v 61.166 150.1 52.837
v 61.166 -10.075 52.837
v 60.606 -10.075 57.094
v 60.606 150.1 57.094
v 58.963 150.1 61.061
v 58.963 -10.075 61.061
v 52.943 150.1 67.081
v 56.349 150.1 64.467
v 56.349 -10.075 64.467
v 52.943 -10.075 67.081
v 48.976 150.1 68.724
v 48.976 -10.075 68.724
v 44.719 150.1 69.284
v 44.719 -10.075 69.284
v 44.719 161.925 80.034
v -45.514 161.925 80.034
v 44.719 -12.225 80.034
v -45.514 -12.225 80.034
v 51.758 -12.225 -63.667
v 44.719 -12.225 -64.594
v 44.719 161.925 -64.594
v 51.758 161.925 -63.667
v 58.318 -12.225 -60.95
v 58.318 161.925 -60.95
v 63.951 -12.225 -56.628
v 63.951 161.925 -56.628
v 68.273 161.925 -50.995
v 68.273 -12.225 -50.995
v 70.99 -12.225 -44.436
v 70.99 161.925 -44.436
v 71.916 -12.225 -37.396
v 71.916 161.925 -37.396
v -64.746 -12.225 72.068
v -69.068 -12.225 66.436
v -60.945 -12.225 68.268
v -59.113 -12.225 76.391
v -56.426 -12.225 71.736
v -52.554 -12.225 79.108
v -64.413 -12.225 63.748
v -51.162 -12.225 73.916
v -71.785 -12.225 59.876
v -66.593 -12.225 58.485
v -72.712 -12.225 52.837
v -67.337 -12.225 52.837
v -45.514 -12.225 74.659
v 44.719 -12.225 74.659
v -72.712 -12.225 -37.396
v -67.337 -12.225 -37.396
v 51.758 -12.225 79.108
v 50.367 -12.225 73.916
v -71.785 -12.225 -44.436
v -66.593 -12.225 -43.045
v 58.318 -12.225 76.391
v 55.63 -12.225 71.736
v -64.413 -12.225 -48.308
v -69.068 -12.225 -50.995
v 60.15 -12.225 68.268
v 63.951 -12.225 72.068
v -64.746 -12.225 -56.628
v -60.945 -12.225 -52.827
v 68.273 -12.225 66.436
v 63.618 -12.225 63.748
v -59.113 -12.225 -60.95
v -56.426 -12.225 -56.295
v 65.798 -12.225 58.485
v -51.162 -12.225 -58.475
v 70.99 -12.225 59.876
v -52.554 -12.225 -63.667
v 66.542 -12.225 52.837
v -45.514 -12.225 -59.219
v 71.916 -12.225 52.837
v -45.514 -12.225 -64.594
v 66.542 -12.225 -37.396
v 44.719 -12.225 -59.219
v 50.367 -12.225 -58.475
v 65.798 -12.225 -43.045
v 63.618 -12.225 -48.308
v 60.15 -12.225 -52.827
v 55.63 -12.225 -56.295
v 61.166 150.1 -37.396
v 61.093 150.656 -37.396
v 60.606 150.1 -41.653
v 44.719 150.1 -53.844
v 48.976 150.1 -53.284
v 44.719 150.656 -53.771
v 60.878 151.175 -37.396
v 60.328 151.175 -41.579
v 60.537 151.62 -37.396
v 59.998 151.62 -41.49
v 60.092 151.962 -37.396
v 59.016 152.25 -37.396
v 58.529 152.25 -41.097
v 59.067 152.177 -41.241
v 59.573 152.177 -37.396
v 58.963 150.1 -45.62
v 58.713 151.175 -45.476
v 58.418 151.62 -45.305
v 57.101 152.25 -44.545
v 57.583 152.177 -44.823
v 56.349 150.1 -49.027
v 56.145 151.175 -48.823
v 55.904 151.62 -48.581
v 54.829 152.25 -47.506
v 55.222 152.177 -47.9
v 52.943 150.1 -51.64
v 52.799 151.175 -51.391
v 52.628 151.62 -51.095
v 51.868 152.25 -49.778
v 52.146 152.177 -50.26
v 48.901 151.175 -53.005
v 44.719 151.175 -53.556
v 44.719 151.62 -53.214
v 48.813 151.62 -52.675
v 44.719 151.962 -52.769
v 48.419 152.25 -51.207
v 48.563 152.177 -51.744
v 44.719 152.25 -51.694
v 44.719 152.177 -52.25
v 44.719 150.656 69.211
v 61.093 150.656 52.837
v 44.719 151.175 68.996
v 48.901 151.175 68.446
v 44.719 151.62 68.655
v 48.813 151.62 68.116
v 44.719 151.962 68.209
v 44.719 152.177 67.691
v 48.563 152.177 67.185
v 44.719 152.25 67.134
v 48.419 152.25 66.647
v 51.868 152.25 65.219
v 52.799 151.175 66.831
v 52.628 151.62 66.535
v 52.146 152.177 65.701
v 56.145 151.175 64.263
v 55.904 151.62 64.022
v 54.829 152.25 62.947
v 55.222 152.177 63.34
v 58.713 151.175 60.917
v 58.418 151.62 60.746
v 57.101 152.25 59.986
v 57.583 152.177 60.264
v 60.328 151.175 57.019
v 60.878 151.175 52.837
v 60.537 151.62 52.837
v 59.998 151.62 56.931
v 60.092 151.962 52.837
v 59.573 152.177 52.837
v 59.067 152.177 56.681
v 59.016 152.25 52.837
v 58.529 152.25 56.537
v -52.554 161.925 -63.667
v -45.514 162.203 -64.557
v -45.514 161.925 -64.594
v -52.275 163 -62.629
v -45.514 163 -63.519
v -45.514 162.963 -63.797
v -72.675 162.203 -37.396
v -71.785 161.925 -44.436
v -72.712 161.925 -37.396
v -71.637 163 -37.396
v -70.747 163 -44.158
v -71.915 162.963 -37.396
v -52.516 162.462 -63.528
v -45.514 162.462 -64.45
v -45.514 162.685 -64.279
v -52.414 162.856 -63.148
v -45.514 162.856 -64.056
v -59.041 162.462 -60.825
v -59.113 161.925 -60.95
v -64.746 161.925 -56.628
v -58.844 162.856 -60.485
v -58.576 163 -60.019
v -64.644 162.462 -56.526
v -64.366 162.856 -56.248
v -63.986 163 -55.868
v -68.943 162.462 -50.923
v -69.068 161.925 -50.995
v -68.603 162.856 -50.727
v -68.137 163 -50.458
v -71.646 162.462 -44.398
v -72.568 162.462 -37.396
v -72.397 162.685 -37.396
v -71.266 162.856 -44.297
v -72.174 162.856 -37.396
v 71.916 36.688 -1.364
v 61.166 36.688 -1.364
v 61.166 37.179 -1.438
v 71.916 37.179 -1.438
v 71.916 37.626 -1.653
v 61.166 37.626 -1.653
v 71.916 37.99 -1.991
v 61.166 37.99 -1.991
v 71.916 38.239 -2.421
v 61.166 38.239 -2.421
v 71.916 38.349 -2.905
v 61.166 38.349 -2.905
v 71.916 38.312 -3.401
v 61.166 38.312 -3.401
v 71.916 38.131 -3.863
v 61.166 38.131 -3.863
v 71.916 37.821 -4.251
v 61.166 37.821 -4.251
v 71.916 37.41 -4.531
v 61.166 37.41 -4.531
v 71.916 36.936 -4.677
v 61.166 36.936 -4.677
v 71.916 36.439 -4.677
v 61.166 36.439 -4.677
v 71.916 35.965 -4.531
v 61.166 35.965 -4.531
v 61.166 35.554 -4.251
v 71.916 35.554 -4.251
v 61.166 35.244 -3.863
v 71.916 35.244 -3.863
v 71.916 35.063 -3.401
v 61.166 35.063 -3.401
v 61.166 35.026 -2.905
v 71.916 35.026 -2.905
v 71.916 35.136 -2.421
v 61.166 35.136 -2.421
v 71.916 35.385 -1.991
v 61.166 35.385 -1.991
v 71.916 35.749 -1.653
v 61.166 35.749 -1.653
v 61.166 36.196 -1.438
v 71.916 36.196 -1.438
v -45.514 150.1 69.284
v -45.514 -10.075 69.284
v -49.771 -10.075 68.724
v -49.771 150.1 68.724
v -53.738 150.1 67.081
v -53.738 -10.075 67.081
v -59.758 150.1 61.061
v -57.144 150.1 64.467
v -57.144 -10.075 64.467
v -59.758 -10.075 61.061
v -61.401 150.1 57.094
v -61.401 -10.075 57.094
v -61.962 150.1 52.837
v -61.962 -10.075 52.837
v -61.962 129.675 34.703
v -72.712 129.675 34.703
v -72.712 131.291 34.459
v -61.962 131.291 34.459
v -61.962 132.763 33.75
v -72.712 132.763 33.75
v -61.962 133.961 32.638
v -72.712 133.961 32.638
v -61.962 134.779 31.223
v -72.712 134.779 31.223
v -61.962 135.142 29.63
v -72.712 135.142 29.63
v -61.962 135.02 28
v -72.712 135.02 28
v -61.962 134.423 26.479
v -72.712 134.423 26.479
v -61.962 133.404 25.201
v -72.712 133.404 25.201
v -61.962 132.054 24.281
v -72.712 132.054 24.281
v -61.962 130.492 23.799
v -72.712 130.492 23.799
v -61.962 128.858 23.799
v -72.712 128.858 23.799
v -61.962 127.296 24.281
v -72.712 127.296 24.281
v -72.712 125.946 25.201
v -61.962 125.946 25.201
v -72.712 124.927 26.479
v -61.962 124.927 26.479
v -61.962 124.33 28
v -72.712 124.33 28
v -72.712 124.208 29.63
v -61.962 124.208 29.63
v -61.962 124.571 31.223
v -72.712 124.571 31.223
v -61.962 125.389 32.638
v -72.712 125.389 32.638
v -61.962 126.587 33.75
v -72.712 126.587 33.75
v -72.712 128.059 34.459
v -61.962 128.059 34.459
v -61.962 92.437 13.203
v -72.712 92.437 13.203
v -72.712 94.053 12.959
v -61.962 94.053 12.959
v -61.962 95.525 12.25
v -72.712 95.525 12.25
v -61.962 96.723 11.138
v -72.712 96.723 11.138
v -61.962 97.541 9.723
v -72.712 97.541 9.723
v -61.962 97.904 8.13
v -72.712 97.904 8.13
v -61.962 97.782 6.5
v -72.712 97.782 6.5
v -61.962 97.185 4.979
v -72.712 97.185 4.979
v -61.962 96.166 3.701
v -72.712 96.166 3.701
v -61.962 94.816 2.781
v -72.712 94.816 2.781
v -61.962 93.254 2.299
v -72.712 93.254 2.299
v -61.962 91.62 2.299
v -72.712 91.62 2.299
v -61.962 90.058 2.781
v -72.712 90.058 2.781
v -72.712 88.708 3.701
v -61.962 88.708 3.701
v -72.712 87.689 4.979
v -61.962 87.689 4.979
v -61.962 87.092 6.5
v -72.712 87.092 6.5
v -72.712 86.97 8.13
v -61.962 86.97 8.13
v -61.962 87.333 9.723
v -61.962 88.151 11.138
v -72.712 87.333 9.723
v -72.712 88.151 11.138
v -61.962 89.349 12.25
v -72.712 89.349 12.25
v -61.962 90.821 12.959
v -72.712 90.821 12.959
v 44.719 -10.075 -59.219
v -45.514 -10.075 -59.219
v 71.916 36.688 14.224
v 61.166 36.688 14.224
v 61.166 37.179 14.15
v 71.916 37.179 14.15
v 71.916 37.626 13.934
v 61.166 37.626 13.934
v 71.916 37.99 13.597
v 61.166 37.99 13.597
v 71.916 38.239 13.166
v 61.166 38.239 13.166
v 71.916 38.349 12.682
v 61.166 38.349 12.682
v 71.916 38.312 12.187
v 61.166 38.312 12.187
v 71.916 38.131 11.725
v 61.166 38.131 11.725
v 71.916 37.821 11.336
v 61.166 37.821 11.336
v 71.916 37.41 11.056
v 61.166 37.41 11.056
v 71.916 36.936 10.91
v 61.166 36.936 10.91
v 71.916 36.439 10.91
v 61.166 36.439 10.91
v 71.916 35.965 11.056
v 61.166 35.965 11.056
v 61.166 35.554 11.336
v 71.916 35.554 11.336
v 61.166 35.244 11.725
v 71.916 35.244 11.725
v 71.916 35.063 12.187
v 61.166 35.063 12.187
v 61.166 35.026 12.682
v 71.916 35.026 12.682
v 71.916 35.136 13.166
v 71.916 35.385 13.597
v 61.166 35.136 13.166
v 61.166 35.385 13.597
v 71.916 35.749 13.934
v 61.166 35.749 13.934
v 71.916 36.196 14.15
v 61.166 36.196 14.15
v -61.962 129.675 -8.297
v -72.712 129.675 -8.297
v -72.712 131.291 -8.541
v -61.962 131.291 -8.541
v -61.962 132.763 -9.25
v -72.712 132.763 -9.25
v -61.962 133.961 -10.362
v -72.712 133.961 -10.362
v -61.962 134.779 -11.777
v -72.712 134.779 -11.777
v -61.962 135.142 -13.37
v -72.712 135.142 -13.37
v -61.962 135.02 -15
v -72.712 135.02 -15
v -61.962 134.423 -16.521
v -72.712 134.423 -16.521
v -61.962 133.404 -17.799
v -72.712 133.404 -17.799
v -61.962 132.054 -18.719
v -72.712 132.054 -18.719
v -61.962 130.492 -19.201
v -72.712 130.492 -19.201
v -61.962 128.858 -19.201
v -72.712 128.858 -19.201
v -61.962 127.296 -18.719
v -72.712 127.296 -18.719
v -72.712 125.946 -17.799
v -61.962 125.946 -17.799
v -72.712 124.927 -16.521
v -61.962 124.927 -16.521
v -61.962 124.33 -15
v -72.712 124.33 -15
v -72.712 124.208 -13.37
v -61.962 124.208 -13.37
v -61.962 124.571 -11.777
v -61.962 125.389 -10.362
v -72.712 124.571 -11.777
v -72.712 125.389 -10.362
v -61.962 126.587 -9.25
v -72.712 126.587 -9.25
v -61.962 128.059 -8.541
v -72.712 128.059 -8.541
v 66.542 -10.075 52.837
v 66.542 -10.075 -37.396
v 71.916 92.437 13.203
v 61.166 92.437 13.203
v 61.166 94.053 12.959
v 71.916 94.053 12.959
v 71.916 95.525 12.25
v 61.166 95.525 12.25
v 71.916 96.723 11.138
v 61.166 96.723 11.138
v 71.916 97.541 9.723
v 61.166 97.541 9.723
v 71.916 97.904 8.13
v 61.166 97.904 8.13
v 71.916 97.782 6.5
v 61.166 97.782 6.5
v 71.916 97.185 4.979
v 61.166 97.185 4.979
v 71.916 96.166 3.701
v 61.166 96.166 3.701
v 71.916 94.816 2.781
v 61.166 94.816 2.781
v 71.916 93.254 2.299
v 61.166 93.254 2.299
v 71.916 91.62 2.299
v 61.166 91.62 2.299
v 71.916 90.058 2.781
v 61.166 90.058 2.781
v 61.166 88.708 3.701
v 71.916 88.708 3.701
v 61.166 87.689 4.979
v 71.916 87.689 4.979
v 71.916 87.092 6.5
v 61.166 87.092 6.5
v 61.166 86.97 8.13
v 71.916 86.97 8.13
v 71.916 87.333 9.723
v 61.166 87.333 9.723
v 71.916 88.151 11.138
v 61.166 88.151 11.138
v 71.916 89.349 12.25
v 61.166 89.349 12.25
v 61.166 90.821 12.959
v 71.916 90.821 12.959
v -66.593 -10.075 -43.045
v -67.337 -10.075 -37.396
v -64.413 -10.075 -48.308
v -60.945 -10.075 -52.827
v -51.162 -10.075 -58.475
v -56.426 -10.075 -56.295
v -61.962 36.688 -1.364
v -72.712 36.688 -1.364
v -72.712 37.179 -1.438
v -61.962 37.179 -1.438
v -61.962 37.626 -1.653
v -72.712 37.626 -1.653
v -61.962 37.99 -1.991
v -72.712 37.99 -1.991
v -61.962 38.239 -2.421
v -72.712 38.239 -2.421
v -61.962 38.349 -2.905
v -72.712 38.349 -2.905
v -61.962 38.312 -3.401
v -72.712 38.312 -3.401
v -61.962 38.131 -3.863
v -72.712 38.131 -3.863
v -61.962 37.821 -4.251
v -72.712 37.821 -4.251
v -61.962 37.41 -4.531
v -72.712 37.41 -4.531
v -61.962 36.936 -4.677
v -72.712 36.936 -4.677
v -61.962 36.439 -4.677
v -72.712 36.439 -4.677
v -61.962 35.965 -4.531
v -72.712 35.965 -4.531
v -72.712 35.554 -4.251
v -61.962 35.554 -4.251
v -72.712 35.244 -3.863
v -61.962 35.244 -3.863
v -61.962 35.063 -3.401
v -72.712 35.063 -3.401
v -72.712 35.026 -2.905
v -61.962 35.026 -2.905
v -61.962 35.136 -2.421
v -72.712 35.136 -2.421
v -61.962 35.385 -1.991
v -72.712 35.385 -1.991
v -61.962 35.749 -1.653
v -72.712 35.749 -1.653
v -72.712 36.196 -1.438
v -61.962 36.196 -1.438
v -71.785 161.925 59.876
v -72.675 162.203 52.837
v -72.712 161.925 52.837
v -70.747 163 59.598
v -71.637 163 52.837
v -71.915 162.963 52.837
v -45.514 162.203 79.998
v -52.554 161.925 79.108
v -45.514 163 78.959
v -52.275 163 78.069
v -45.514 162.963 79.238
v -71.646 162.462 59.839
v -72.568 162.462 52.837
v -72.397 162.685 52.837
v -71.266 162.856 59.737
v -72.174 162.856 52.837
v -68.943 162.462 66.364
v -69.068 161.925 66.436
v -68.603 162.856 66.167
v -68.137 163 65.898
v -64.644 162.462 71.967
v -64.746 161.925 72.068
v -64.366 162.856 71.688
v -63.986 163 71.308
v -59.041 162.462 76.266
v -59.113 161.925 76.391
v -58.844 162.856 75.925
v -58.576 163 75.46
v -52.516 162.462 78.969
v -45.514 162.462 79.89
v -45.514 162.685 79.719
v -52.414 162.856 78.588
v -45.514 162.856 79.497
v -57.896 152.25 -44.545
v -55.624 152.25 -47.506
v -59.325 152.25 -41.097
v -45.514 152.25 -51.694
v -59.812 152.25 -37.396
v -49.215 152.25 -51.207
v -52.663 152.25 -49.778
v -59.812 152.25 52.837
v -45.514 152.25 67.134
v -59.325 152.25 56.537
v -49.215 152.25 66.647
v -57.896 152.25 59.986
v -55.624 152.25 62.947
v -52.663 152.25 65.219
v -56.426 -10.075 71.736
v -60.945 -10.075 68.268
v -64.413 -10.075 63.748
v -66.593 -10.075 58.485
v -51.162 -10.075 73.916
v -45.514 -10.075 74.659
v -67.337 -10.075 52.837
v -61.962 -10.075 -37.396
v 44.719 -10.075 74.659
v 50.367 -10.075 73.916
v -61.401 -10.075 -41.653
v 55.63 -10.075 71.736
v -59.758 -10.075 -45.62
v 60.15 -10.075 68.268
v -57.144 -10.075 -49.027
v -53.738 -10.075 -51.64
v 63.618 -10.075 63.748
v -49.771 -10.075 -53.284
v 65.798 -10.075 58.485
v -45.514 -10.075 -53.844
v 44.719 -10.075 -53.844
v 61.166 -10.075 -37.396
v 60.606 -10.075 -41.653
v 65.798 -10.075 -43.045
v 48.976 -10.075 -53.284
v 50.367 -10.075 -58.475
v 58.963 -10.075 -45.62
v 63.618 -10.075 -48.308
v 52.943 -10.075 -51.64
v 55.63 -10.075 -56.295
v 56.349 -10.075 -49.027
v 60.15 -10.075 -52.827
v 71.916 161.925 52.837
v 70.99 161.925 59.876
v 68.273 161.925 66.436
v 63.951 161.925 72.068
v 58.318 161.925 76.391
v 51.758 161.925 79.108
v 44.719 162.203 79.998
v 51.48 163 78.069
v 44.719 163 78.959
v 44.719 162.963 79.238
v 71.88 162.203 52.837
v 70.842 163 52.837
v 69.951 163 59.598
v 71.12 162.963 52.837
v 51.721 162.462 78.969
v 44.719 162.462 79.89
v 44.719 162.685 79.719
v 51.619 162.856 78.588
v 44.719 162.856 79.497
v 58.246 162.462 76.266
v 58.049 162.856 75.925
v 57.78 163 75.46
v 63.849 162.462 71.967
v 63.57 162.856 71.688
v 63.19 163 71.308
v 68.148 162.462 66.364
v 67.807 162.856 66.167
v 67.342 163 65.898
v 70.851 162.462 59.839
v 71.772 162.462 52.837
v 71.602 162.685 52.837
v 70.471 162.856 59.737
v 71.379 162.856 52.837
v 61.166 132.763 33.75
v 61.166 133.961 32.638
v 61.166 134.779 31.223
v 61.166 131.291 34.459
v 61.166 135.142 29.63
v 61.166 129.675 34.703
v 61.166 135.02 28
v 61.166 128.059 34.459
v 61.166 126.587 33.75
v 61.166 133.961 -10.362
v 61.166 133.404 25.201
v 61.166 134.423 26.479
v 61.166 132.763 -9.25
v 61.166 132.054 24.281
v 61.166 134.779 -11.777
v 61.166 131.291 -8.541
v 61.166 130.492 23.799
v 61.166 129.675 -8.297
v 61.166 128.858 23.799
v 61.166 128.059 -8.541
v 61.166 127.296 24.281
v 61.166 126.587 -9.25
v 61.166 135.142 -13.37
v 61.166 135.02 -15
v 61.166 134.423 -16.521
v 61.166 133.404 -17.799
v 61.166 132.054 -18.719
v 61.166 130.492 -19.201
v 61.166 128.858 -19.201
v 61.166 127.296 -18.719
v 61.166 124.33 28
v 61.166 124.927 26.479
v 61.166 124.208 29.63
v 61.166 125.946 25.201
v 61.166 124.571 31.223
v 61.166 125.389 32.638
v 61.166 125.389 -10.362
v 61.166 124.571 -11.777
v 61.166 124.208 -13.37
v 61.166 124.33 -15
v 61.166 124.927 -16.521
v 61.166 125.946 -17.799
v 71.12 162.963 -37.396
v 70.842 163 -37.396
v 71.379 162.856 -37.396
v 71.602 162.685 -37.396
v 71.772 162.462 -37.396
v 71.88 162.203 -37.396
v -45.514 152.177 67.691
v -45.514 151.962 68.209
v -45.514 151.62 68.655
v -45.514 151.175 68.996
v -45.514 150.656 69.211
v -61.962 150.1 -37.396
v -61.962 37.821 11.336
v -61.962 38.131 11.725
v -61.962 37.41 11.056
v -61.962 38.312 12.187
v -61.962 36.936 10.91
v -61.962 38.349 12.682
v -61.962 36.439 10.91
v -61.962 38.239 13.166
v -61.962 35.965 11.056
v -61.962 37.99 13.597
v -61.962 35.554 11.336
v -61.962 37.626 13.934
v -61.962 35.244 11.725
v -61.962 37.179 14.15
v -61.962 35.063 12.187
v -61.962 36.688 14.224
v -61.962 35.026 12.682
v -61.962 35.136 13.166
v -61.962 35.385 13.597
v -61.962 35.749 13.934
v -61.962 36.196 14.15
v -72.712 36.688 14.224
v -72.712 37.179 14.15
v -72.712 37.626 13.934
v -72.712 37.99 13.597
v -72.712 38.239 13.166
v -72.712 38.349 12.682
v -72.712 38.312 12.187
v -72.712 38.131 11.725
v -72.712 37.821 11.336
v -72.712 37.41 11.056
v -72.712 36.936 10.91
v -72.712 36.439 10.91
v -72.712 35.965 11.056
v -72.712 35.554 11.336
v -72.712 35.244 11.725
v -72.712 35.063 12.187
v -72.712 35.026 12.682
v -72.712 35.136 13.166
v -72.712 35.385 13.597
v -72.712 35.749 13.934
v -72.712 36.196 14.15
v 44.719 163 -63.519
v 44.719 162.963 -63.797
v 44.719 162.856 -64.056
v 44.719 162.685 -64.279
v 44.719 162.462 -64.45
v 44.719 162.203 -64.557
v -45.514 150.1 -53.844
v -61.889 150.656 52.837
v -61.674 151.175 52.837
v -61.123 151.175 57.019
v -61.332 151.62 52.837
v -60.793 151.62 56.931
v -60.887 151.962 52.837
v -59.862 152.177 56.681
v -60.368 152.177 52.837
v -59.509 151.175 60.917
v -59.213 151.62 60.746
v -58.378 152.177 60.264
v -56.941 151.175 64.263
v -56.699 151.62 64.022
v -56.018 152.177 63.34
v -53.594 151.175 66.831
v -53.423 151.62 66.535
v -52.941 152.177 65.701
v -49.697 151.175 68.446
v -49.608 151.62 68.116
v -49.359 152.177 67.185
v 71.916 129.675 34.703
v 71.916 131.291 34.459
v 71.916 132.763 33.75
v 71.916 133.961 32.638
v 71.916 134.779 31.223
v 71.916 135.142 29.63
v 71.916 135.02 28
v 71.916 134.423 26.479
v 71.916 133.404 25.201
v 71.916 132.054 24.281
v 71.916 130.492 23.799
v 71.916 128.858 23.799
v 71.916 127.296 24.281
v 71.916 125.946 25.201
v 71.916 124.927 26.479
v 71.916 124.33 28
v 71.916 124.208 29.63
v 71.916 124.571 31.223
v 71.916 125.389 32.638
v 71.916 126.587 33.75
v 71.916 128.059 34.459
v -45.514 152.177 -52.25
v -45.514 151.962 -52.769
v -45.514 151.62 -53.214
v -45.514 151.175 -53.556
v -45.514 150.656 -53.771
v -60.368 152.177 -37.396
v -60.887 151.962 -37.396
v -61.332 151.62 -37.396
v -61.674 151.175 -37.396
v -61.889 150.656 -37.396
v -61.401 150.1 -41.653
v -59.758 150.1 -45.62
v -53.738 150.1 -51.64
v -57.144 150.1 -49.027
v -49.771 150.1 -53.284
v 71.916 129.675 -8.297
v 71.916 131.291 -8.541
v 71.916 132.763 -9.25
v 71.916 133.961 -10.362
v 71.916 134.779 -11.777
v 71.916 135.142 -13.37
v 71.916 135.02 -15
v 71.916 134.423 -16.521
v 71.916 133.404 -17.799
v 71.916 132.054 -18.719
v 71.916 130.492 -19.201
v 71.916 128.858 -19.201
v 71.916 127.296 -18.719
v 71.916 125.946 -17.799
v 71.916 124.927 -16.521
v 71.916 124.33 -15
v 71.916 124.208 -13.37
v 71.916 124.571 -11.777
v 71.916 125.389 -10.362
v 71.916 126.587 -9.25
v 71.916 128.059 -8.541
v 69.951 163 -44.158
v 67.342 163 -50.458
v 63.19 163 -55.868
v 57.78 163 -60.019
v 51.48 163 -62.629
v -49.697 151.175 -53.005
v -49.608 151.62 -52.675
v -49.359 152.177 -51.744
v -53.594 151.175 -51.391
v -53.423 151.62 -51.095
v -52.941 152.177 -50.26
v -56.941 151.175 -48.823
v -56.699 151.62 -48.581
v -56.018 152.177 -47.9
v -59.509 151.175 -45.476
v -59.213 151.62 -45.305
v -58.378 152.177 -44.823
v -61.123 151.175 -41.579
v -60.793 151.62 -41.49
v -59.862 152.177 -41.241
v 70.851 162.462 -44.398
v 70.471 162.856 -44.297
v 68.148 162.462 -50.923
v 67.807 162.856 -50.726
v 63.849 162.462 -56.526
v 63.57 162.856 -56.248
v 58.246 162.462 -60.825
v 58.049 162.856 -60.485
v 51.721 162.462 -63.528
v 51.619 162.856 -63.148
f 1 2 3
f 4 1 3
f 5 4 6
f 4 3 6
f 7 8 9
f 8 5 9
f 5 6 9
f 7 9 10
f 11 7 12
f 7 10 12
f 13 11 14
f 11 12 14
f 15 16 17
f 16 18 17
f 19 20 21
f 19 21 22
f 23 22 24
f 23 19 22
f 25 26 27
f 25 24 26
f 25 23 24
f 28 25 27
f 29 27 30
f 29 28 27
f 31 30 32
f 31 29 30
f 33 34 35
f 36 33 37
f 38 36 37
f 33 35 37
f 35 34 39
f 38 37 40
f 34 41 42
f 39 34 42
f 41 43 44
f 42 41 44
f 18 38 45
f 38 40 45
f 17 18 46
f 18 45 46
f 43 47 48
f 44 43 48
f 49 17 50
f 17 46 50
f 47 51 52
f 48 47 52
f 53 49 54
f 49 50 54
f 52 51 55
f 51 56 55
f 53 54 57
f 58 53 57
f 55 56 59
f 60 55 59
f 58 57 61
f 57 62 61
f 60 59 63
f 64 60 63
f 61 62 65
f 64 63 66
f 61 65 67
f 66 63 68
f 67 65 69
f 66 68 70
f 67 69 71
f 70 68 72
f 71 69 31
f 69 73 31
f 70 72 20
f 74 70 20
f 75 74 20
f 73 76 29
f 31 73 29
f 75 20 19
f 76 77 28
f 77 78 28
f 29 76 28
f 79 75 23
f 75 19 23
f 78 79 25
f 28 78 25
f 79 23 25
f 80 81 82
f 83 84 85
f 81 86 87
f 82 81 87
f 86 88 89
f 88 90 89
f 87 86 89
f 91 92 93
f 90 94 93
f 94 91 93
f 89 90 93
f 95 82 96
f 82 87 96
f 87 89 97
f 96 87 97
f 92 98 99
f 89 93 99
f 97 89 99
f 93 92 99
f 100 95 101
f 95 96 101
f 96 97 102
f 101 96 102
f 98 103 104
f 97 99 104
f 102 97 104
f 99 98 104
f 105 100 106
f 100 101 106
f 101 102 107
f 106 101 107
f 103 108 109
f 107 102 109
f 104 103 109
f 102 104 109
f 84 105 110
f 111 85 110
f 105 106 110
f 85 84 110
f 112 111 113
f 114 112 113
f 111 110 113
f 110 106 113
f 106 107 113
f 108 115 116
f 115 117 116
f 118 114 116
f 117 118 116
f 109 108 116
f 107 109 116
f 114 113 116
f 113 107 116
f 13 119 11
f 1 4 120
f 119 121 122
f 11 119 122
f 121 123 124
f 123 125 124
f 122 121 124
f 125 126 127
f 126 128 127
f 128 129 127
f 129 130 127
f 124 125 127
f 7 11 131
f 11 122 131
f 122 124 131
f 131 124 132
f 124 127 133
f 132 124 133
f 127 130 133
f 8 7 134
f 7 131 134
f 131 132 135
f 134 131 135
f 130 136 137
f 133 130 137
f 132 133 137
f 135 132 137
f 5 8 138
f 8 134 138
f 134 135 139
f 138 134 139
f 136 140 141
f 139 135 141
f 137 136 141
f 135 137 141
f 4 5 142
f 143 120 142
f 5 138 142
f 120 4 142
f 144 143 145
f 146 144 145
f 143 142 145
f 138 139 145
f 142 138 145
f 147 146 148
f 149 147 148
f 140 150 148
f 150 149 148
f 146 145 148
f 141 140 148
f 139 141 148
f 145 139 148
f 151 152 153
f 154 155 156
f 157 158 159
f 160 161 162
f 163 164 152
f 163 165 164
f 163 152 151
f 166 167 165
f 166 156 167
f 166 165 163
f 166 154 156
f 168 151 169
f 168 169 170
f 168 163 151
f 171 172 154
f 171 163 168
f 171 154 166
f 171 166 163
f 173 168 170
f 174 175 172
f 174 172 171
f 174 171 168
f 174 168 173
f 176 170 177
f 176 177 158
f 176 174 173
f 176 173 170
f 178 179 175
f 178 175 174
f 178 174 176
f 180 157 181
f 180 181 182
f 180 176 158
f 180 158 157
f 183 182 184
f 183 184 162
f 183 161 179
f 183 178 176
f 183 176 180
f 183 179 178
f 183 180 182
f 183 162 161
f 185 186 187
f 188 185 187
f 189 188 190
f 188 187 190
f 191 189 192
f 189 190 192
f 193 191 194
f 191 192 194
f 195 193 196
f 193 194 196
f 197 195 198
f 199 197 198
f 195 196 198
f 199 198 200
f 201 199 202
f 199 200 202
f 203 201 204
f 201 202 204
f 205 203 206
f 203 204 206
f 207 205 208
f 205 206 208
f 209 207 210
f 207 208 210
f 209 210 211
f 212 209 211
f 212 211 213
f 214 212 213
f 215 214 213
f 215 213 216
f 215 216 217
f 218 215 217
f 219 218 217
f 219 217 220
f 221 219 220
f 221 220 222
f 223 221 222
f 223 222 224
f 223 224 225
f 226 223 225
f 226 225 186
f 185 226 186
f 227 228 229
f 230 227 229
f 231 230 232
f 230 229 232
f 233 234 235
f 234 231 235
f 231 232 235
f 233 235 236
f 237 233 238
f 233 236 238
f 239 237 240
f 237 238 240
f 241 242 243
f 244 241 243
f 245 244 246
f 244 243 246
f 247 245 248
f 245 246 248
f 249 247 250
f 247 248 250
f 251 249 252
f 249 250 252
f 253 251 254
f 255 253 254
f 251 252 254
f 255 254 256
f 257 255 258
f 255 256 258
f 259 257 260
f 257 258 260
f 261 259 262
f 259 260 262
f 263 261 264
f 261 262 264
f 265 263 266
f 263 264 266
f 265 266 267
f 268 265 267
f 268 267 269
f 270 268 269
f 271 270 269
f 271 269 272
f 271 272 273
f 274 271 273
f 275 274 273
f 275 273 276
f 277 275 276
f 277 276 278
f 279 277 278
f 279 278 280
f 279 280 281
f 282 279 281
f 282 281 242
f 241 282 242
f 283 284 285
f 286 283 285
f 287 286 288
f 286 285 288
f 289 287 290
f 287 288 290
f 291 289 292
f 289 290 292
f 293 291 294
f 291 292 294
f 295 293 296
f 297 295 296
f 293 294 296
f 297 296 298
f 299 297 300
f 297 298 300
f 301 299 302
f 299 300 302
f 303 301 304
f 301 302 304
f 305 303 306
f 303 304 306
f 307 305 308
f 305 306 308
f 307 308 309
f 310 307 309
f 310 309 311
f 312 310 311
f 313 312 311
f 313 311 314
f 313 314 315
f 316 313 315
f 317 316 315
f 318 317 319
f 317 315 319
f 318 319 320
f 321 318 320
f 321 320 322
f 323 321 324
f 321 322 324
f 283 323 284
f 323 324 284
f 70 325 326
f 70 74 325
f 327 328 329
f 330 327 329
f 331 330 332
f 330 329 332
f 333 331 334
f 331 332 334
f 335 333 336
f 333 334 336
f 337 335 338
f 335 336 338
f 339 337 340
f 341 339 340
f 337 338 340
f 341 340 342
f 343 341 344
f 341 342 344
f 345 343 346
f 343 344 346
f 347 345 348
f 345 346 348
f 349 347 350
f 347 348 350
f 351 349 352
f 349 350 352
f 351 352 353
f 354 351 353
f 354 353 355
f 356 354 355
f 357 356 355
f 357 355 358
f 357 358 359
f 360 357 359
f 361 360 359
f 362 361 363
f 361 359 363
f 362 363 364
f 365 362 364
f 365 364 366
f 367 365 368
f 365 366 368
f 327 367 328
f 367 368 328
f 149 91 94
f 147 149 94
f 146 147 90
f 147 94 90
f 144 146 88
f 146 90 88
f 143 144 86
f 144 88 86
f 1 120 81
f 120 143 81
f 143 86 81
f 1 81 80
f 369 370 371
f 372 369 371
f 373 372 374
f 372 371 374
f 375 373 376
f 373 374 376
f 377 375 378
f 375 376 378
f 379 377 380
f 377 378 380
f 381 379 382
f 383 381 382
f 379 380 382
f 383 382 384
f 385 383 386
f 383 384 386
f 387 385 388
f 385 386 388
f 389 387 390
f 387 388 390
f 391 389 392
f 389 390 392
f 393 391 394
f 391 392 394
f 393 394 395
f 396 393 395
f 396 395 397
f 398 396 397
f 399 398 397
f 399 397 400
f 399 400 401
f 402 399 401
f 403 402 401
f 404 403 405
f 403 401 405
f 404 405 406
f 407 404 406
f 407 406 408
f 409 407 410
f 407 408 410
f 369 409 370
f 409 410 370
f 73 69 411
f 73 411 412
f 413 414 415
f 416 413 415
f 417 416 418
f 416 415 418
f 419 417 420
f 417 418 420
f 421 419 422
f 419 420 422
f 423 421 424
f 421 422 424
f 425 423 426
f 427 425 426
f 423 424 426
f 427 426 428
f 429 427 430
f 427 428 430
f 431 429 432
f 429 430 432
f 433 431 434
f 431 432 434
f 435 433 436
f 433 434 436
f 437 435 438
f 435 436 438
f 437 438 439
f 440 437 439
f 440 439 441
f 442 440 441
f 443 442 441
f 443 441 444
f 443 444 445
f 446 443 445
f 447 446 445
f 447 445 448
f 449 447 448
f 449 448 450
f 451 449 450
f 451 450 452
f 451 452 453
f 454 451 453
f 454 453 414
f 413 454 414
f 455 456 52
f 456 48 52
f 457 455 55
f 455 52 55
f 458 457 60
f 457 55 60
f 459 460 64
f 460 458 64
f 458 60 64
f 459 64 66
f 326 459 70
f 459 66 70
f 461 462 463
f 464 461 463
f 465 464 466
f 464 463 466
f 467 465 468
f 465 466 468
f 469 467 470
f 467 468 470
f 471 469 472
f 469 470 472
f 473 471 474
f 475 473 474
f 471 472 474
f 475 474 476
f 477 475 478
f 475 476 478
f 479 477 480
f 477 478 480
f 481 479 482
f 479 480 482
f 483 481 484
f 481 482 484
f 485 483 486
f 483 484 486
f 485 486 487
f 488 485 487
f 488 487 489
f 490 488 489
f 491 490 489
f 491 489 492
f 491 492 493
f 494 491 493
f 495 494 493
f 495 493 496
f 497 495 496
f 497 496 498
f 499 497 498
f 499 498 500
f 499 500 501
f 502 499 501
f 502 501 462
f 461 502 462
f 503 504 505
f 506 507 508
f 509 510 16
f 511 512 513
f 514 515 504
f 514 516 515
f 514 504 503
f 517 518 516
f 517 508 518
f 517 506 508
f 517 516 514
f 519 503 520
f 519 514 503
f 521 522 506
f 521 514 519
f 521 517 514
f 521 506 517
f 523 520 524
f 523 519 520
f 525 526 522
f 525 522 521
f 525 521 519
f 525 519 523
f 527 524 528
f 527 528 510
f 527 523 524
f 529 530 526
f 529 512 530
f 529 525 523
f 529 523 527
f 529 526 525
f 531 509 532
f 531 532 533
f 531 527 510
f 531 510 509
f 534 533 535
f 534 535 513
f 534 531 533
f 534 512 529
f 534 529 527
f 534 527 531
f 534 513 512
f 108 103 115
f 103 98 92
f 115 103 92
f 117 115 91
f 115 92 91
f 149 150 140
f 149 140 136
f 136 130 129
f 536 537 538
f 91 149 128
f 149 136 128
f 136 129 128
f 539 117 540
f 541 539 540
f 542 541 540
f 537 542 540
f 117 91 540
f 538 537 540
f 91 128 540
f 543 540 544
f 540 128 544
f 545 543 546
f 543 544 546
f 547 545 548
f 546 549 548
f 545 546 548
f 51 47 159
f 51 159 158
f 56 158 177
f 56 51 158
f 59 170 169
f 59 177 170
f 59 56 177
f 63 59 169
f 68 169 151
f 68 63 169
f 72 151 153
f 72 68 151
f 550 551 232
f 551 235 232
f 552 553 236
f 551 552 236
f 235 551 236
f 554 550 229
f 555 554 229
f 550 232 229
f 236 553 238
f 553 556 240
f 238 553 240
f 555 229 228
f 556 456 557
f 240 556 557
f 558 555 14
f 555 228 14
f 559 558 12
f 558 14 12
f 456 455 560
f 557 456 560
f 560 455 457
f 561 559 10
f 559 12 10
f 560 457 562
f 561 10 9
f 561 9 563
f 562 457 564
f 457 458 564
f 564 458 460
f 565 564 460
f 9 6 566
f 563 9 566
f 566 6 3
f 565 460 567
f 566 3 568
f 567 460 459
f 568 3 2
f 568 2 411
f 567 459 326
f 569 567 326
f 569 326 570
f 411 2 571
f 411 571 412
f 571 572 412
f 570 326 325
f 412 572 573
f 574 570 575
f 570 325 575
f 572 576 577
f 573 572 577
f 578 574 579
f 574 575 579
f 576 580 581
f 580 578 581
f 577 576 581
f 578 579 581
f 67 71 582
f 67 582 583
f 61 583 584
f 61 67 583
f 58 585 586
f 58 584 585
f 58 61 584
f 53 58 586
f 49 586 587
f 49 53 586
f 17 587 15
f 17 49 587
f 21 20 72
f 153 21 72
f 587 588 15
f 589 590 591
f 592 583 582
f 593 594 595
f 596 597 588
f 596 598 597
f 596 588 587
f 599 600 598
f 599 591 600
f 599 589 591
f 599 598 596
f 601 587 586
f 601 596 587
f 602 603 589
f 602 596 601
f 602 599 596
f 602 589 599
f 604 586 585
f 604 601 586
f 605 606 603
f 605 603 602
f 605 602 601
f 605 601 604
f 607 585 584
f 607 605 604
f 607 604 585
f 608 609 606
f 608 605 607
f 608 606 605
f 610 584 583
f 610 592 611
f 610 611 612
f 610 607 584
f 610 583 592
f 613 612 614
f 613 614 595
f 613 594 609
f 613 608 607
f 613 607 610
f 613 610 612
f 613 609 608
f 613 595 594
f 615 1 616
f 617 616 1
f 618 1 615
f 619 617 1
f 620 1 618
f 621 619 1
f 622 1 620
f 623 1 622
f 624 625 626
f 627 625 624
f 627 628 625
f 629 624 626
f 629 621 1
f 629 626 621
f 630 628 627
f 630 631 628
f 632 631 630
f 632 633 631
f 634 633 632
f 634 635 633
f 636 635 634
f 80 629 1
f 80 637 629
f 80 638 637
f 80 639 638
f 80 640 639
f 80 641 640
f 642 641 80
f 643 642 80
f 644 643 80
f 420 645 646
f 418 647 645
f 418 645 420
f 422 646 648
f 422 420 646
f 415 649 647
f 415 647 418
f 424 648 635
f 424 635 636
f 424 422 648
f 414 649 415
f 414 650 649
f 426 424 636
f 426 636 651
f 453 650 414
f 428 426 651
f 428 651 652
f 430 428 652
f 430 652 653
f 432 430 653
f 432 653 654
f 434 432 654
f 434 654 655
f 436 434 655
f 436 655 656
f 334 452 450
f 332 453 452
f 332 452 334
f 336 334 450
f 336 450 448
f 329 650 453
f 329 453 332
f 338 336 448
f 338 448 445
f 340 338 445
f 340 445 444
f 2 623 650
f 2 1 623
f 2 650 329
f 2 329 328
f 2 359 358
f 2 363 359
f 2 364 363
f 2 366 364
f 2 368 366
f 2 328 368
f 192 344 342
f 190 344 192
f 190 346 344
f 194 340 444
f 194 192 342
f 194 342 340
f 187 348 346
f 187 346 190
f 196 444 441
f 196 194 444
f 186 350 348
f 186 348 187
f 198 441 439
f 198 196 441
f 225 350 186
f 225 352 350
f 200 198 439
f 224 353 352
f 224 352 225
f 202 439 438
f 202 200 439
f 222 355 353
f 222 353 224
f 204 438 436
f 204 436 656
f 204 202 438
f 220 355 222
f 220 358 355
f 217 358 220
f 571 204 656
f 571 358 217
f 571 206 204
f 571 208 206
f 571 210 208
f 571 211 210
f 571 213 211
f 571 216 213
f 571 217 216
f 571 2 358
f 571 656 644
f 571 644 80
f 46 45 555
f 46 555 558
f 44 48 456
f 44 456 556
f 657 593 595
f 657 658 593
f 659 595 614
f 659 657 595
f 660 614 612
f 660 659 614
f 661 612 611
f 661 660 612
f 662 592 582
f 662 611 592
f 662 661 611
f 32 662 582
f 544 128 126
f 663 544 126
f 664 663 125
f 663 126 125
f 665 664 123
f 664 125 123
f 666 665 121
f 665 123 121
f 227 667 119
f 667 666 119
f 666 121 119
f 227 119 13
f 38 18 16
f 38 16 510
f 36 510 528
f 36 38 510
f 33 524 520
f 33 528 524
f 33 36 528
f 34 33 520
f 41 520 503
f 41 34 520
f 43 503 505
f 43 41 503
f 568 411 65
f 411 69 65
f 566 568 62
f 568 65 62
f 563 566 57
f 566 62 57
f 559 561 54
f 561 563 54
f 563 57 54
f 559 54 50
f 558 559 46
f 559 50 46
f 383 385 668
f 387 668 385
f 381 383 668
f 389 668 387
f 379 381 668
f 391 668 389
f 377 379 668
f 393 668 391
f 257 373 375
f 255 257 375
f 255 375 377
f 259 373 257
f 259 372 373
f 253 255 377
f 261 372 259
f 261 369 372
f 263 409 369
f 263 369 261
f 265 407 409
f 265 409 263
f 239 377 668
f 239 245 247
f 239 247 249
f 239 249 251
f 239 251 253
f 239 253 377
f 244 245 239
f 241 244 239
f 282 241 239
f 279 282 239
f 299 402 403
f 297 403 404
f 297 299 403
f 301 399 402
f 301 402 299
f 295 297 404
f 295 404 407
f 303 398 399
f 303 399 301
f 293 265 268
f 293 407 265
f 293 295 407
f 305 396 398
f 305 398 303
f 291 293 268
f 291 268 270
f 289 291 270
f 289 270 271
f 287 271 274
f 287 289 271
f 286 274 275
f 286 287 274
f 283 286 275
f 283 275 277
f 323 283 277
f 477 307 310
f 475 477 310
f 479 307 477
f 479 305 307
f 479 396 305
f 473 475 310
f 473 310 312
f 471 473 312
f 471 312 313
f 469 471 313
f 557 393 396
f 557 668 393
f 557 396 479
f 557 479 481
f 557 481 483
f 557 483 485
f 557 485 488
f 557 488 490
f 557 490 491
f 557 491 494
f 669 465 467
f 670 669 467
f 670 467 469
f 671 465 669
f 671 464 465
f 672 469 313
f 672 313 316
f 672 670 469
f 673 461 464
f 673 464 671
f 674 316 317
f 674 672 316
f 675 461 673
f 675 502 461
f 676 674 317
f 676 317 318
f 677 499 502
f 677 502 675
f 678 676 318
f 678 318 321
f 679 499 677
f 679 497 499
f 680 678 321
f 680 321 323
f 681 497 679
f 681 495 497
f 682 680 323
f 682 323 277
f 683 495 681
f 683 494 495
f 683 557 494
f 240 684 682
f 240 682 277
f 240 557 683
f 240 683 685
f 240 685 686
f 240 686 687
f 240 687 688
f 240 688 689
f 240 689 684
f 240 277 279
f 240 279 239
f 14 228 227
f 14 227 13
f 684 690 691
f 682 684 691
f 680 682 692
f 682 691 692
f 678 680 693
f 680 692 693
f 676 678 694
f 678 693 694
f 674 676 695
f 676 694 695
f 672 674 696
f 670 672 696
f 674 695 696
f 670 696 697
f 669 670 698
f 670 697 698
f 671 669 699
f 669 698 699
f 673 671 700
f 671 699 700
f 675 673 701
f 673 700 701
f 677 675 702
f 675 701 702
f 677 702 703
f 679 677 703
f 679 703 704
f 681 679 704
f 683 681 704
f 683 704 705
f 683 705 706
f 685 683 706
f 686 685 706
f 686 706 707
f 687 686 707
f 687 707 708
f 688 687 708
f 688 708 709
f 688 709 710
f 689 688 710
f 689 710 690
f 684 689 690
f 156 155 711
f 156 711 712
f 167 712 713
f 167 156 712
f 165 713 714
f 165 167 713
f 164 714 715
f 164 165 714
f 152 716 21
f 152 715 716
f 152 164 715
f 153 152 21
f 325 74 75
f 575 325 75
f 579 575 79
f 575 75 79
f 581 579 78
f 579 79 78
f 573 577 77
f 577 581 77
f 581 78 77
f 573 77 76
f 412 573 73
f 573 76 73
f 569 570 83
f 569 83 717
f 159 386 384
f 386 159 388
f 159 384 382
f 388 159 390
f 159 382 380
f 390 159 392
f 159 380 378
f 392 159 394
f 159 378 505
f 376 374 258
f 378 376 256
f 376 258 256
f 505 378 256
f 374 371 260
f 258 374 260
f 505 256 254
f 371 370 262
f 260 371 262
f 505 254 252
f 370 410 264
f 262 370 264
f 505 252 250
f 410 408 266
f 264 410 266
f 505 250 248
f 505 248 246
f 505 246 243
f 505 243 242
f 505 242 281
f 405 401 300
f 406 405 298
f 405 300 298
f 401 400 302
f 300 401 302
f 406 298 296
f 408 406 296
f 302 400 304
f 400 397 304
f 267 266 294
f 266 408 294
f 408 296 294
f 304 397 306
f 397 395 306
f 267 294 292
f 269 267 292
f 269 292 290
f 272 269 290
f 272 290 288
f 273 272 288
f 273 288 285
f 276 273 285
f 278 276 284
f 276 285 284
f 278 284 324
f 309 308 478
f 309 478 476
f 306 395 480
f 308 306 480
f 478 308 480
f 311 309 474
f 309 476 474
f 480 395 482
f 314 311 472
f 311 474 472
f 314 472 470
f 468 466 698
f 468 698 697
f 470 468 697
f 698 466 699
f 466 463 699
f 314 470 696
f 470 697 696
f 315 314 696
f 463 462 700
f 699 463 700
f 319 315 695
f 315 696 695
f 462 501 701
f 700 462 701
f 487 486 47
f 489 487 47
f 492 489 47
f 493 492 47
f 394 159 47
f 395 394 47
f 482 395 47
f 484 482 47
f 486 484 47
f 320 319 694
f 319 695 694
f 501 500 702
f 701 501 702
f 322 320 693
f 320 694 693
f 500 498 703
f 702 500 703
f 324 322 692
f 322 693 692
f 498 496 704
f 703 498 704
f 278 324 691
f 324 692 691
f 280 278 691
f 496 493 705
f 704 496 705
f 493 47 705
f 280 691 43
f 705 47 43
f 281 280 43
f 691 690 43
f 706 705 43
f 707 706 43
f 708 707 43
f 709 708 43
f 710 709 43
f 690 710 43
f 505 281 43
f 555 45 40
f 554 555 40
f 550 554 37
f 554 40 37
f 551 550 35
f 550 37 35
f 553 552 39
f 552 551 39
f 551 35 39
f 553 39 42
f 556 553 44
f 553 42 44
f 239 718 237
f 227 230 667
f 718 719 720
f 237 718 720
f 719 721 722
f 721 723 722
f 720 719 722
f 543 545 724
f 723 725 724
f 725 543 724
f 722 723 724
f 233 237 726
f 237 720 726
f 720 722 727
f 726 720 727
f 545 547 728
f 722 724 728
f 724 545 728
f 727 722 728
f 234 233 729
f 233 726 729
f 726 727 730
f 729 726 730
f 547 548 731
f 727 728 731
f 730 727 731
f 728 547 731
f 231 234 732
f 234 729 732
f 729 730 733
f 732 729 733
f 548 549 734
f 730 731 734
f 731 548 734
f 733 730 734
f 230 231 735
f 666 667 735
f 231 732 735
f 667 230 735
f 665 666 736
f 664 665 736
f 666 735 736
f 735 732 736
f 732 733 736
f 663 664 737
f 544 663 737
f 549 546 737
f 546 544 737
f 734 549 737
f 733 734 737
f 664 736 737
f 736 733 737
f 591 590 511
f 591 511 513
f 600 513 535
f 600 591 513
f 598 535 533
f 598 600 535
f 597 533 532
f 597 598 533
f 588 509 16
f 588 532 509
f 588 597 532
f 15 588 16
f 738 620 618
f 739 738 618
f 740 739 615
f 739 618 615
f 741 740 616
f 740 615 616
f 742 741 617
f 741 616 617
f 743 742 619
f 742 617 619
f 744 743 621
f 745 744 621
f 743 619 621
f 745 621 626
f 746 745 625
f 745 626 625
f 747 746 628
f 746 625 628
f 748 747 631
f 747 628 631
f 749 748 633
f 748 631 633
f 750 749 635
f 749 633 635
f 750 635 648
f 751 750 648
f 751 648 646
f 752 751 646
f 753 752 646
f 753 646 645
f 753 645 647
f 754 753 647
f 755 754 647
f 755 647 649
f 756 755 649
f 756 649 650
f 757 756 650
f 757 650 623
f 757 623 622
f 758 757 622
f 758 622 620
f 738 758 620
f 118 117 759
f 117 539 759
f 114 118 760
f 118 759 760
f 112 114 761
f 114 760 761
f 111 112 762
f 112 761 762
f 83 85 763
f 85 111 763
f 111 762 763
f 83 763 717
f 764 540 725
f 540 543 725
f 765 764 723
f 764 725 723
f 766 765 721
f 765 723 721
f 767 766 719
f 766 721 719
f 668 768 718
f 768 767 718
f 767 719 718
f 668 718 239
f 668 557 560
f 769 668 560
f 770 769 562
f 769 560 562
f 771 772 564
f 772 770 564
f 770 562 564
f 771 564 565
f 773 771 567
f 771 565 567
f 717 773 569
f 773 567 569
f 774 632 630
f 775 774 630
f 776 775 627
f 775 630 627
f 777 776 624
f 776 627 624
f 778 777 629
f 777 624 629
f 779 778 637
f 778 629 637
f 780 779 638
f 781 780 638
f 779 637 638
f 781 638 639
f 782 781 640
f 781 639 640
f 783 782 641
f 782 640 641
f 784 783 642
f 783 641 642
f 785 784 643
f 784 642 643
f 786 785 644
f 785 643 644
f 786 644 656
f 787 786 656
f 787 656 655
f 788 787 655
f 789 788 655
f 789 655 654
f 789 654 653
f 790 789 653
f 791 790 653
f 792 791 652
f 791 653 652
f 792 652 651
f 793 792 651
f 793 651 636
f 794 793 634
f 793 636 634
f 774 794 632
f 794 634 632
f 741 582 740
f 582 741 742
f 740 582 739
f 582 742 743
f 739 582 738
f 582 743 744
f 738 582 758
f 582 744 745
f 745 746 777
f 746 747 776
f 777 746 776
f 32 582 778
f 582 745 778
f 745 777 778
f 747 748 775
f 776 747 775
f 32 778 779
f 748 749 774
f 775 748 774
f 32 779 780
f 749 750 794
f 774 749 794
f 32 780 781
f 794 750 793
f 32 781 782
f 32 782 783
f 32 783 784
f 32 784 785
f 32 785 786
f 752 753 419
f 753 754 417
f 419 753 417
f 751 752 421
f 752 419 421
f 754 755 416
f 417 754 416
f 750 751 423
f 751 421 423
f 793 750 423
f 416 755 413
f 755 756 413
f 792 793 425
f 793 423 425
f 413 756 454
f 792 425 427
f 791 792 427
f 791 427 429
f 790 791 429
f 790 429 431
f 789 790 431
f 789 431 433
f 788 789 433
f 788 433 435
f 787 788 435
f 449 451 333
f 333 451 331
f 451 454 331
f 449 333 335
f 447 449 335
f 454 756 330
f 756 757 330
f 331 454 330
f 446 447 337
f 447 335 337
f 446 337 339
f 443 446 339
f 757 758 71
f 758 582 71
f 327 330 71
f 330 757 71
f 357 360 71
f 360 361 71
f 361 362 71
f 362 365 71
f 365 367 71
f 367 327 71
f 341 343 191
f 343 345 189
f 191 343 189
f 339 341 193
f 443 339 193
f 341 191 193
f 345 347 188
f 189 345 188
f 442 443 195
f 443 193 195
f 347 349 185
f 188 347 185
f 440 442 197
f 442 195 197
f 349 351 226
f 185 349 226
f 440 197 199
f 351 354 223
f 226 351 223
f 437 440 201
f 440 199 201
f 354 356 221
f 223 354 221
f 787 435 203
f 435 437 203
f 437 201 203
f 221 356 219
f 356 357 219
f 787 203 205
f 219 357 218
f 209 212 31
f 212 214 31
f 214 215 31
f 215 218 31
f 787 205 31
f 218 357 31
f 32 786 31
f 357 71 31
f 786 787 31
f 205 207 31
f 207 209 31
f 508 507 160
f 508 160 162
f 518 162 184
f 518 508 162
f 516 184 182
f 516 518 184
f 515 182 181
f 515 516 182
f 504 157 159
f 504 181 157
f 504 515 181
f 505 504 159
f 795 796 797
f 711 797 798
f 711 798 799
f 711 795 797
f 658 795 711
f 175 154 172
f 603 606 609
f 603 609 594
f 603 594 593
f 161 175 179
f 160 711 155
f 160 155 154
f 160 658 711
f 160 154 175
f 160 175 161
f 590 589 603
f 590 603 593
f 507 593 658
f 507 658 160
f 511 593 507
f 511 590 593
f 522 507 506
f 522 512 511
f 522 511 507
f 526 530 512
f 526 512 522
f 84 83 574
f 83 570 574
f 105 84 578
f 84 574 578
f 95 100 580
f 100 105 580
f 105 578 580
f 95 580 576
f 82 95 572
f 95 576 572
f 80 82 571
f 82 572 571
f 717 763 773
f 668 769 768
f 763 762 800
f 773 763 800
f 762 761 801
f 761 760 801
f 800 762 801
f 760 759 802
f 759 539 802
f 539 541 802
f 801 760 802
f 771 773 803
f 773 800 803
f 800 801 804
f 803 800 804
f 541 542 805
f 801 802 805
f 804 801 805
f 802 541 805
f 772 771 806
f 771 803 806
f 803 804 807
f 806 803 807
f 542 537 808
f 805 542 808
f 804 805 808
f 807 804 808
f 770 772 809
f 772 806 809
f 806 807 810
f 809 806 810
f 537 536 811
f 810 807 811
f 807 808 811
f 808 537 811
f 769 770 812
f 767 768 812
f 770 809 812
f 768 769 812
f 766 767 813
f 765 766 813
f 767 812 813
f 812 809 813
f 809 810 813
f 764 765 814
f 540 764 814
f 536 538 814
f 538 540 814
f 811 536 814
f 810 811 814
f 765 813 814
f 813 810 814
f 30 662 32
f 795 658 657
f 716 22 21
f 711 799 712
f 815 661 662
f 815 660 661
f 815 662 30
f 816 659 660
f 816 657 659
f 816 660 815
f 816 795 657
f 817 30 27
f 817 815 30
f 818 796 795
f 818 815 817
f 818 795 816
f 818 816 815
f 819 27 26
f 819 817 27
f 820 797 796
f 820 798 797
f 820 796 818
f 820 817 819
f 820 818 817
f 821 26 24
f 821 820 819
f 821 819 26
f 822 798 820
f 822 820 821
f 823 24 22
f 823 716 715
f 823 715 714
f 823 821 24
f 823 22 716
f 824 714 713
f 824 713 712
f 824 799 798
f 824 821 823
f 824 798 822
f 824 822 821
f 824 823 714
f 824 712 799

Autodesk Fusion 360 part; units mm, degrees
sketch "Esquisse1" plane through (0, 0, 0) normal (0, 1, 0) x (1, 0, 0)
  arc A0 (59.719, 39.219) -> (44.719, 54.219) centre (44.719, 39.219) ccw construction
  line L0 (-39.219, -59.719) -> (44.719, -59.719) construction
  line L1 (-54.219, 39.219) -> (-54.219, -44.719) construction
  line L2 (-54.219, 54.219) -> (59.719, -59.719) construction
  line L3 (54.219, -12.5) -> (54.219, 12.5) construction
  arc A1 (44.719, -59.719) -> (59.719, -44.719) centre (44.719, -44.719) ccw construction
  arc A2 (-54.219, -44.719) -> (-39.219, -59.719) centre (-39.219, -44.719) ccw construction
  line L4 (44.719, 54.219) -> (-39.219, 54.219) construction
  line L5 (59.719, -44.719) -> (59.719, 39.219) construction
  arc A3 (-39.219, 54.219) -> (-54.219, 39.219) centre (-39.219, 39.219) ccw construction
  line L6 (-54.519, 39.219) -> (-54.519, -44.719)
  arc A4 (-54.519, -44.719) -> (-39.219, -60.019) centre (-39.219, -44.719) ccw
  line L7 (-39.219, -60.019) -> (44.719, -60.019)
  arc A5 (44.719, -60.019) -> (60.019, -44.719) centre (44.719, -44.719) ccw
  line L8 (60.019, -44.719) -> (60.019, 39.219)
  arc A6 (60.019, 39.219) -> (44.719, 54.519) centre (44.719, 39.219) ccw
  line L9 (44.719, 54.519) -> (-39.219, 54.519)
  arc A7 (-39.219, 54.519) -> (-54.519, 39.219) centre (-39.219, 39.219) ccw
  line L10 (-64.519, 39.219) -> (-64.519, -44.719)
  arc A8 (-64.519, -44.719) -> (-39.219, -70.019) centre (-39.219, -44.719) ccw
  line L11 (-39.219, -70.019) -> (44.719, -70.019)
  arc A9 (44.719, -70.019) -> (70.019, -44.719) centre (44.719, -44.719) ccw
  line L12 (70.019, -44.719) -> (70.019, 39.219)
  arc A10 (70.019, 39.219) -> (44.719, 64.519) centre (44.719, 39.219) ccw
  line L13 (44.719, 64.519) -> (-39.219, 64.519)
  arc A11 (-39.219, 64.519) -> (-64.519, 39.219) centre (-39.219, 39.219) ccw
  line L14 (-39.219, -65.019) -> (44.719, -65.019)
  arc A12 (44.719, -65.019) -> (65.019, -44.719) centre (44.719, -44.719) ccw
  line L15 (65.019, -44.719) -> (65.019, 39.219)
  arc A13 (65.019, 39.219) -> (44.719, 59.519) centre (44.719, 39.219) ccw
  line L16 (44.719, 59.519) -> (-39.219, 59.519)
  arc A14 (-39.219, 59.519) -> (-59.519, 39.219) centre (-39.219, 39.219) ccw
  line L17 (-59.519, 39.219) -> (-59.519, -44.719)
  arc A15 (-59.519, -44.719) -> (-39.219, -65.019) centre (-39.219, -44.719) ccw
  point P0 (54.219, 0)
  point P1 (54.219, 0)
  dimension "d2" = 15
  dimension "d3" = 15
  dimension "d4" = 113.9381
  dimension "d11" = 0.3
  dimension "d12" = 10
  dimension "d13" = 5
extrude "Extrusion1" add sketch "Esquisse1" along normal blind 153 contours L10 A8 L11 A9 L12 A10 L13 A11 | L14 A12 L15 A13 L16 A14 L17 A15
extrude "Extrusion2" cut sketch "Esquisse1" along normal blind 2 contours L14 A12 L15 A13 L16 A14 L17 A15
sketch "Esquisse2" plane through (0, 153, 0) normal (0, 1, 0) x (-1, 0, 0)
  arc A0 (39.219, -54.519) -> (54.519, -39.219) centre (39.219, -39.219) ccw
  line L0 (39.219, -54.519) -> (-44.719, -54.519)
  arc A1 (-60.019, -39.219) -> (-44.719, -54.519) centre (-44.719, -39.219) ccw
  line L1 (-60.019, -39.219) -> (-60.019, 44.719)
  arc A2 (-44.719, 60.019) -> (-60.019, 44.719) centre (-44.719, 44.719) ccw
  line L2 (-44.719, 60.019) -> (39.219, 60.019)
  arc A3 (54.519, 44.719) -> (39.219, 60.019) centre (39.219, 44.719) ccw
  line L3 (54.519, 44.719) -> (54.519, -39.219)
  arc A4 (39.219, -64.519) -> (64.519, -39.219) centre (39.219, -39.219) ccw
  line L4 (64.519, -39.219) -> (64.519, 44.719)
  arc A5 (64.519, 44.719) -> (39.219, 70.019) centre (39.219, 44.719) ccw
  line L5 (39.219, 70.019) -> (-44.719, 70.019)
  arc A6 (-44.719, 70.019) -> (-70.019, 44.719) centre (-44.719, 44.719) ccw
  line L6 (-70.019, 44.719) -> (-70.019, -39.219)
  arc A7 (-70.019, -39.219) -> (-44.719, -64.519) centre (-44.719, -39.219) ccw
  line L7 (-44.719, -64.519) -> (39.219, -64.519)
extrude "Extrusion3" add sketch "Esquisse2" along normal blind 10 contours A0 L0 A1 L1 A2 L2 A3 L3 | A4 L4 A5 L5 A6 L6 A7 L7
fillet "Congé1" radius 2 8 edges at (-54.519, 153, 2.75) (-50.0378, 153, -50.0378) (2.75, 153, -54.519) (55.5378, 153, -50.0378) (60.019, 153, 2.75) (55.5378, 153, 55.5378) (2.75, 153, 60.019) (-50.0378, 153, 55.5378)
fillet "Congé2" radius 1 8 edges at (-64.519, 163, 2.75) (-57.1088, 163, 62.6088) (2.75, 163, 70.019) (62.6088, 163, 62.6088) (70.019, 163, 2.75) (62.6088, 163, -57.1088) (2.75, 163, -64.519) (-57.1088, 163, -57.1088)
sketch "Esquisse3" plane through (-64.519, 0, 0) normal (-1, 0, 0) x (0, 0, 1)
  line L0 (44.719, 162) -> (-39.219, 162)
  line L1 (-39.219, 162) -> (-39.219, 0)
  line L2 (-39.219, 0) -> (44.719, 0)
  line L3 (44.719, 0) -> (44.719, 162)
  line L4 (-10.75, 49) -> (10.75, 49) construction
  line L5 (10.75, 49) -> (10.75, 0) construction
  line L6 (-10.75, 0) -> (-10.75, 49) construction
  circle A0 centre (-7.25, 45.5) radius 1.55
  circle A1 centre (7.25, 45.5) radius 1.55
  line L7 (-7.25, 45.5) -> (7.25, 45.5) construction
  line L8 (2.75, 162) -> (2.75, 132) construction
  line L9 (-17.25, 132) -> (22.75, 132) construction
  circle A2 centre (22.75, 132) radius 5.1
  circle A3 centre (-17.25, 132) radius 5.1
  line L10 (2.75, 132) -> (2.75, 97.36) construction
  circle A4 centre (2.75, 97.36) radius 5.1
  point P0 (2.75, 132)
  dimension "d24" = 49
  dimension "d25" = 21.5
  dimension "d26" = 3.1
  dimension "d27" = 3.1
  dimension "d28" = 14.5
  dimension "d29" = 3.5
  dimension "d30" = 3.5
  dimension "d31" = 30
  dimension "d32" = 40
  dimension "d33" = 34.64
  dimension "d34" = 10.2
  dimension "d35" = 10.2
  dimension "d36" = 10.2
extrude "Extrusion4" cut sketch "Esquisse3" against normal blind 2000 contours A0
extrude "Extrusion5" cut sketch "Esquisse3" against normal blind 2000 contours A1 | A2 | A3 | A4
scale "Echelle2" factor 1.075 about (44.719, 163, -63.519) bodies 1
equation "d4 = ( 430 mm - d2 * ( 2 * 3.141592 - 8 ) ) / 4"
equation "d33 = 0.866 * d32"
